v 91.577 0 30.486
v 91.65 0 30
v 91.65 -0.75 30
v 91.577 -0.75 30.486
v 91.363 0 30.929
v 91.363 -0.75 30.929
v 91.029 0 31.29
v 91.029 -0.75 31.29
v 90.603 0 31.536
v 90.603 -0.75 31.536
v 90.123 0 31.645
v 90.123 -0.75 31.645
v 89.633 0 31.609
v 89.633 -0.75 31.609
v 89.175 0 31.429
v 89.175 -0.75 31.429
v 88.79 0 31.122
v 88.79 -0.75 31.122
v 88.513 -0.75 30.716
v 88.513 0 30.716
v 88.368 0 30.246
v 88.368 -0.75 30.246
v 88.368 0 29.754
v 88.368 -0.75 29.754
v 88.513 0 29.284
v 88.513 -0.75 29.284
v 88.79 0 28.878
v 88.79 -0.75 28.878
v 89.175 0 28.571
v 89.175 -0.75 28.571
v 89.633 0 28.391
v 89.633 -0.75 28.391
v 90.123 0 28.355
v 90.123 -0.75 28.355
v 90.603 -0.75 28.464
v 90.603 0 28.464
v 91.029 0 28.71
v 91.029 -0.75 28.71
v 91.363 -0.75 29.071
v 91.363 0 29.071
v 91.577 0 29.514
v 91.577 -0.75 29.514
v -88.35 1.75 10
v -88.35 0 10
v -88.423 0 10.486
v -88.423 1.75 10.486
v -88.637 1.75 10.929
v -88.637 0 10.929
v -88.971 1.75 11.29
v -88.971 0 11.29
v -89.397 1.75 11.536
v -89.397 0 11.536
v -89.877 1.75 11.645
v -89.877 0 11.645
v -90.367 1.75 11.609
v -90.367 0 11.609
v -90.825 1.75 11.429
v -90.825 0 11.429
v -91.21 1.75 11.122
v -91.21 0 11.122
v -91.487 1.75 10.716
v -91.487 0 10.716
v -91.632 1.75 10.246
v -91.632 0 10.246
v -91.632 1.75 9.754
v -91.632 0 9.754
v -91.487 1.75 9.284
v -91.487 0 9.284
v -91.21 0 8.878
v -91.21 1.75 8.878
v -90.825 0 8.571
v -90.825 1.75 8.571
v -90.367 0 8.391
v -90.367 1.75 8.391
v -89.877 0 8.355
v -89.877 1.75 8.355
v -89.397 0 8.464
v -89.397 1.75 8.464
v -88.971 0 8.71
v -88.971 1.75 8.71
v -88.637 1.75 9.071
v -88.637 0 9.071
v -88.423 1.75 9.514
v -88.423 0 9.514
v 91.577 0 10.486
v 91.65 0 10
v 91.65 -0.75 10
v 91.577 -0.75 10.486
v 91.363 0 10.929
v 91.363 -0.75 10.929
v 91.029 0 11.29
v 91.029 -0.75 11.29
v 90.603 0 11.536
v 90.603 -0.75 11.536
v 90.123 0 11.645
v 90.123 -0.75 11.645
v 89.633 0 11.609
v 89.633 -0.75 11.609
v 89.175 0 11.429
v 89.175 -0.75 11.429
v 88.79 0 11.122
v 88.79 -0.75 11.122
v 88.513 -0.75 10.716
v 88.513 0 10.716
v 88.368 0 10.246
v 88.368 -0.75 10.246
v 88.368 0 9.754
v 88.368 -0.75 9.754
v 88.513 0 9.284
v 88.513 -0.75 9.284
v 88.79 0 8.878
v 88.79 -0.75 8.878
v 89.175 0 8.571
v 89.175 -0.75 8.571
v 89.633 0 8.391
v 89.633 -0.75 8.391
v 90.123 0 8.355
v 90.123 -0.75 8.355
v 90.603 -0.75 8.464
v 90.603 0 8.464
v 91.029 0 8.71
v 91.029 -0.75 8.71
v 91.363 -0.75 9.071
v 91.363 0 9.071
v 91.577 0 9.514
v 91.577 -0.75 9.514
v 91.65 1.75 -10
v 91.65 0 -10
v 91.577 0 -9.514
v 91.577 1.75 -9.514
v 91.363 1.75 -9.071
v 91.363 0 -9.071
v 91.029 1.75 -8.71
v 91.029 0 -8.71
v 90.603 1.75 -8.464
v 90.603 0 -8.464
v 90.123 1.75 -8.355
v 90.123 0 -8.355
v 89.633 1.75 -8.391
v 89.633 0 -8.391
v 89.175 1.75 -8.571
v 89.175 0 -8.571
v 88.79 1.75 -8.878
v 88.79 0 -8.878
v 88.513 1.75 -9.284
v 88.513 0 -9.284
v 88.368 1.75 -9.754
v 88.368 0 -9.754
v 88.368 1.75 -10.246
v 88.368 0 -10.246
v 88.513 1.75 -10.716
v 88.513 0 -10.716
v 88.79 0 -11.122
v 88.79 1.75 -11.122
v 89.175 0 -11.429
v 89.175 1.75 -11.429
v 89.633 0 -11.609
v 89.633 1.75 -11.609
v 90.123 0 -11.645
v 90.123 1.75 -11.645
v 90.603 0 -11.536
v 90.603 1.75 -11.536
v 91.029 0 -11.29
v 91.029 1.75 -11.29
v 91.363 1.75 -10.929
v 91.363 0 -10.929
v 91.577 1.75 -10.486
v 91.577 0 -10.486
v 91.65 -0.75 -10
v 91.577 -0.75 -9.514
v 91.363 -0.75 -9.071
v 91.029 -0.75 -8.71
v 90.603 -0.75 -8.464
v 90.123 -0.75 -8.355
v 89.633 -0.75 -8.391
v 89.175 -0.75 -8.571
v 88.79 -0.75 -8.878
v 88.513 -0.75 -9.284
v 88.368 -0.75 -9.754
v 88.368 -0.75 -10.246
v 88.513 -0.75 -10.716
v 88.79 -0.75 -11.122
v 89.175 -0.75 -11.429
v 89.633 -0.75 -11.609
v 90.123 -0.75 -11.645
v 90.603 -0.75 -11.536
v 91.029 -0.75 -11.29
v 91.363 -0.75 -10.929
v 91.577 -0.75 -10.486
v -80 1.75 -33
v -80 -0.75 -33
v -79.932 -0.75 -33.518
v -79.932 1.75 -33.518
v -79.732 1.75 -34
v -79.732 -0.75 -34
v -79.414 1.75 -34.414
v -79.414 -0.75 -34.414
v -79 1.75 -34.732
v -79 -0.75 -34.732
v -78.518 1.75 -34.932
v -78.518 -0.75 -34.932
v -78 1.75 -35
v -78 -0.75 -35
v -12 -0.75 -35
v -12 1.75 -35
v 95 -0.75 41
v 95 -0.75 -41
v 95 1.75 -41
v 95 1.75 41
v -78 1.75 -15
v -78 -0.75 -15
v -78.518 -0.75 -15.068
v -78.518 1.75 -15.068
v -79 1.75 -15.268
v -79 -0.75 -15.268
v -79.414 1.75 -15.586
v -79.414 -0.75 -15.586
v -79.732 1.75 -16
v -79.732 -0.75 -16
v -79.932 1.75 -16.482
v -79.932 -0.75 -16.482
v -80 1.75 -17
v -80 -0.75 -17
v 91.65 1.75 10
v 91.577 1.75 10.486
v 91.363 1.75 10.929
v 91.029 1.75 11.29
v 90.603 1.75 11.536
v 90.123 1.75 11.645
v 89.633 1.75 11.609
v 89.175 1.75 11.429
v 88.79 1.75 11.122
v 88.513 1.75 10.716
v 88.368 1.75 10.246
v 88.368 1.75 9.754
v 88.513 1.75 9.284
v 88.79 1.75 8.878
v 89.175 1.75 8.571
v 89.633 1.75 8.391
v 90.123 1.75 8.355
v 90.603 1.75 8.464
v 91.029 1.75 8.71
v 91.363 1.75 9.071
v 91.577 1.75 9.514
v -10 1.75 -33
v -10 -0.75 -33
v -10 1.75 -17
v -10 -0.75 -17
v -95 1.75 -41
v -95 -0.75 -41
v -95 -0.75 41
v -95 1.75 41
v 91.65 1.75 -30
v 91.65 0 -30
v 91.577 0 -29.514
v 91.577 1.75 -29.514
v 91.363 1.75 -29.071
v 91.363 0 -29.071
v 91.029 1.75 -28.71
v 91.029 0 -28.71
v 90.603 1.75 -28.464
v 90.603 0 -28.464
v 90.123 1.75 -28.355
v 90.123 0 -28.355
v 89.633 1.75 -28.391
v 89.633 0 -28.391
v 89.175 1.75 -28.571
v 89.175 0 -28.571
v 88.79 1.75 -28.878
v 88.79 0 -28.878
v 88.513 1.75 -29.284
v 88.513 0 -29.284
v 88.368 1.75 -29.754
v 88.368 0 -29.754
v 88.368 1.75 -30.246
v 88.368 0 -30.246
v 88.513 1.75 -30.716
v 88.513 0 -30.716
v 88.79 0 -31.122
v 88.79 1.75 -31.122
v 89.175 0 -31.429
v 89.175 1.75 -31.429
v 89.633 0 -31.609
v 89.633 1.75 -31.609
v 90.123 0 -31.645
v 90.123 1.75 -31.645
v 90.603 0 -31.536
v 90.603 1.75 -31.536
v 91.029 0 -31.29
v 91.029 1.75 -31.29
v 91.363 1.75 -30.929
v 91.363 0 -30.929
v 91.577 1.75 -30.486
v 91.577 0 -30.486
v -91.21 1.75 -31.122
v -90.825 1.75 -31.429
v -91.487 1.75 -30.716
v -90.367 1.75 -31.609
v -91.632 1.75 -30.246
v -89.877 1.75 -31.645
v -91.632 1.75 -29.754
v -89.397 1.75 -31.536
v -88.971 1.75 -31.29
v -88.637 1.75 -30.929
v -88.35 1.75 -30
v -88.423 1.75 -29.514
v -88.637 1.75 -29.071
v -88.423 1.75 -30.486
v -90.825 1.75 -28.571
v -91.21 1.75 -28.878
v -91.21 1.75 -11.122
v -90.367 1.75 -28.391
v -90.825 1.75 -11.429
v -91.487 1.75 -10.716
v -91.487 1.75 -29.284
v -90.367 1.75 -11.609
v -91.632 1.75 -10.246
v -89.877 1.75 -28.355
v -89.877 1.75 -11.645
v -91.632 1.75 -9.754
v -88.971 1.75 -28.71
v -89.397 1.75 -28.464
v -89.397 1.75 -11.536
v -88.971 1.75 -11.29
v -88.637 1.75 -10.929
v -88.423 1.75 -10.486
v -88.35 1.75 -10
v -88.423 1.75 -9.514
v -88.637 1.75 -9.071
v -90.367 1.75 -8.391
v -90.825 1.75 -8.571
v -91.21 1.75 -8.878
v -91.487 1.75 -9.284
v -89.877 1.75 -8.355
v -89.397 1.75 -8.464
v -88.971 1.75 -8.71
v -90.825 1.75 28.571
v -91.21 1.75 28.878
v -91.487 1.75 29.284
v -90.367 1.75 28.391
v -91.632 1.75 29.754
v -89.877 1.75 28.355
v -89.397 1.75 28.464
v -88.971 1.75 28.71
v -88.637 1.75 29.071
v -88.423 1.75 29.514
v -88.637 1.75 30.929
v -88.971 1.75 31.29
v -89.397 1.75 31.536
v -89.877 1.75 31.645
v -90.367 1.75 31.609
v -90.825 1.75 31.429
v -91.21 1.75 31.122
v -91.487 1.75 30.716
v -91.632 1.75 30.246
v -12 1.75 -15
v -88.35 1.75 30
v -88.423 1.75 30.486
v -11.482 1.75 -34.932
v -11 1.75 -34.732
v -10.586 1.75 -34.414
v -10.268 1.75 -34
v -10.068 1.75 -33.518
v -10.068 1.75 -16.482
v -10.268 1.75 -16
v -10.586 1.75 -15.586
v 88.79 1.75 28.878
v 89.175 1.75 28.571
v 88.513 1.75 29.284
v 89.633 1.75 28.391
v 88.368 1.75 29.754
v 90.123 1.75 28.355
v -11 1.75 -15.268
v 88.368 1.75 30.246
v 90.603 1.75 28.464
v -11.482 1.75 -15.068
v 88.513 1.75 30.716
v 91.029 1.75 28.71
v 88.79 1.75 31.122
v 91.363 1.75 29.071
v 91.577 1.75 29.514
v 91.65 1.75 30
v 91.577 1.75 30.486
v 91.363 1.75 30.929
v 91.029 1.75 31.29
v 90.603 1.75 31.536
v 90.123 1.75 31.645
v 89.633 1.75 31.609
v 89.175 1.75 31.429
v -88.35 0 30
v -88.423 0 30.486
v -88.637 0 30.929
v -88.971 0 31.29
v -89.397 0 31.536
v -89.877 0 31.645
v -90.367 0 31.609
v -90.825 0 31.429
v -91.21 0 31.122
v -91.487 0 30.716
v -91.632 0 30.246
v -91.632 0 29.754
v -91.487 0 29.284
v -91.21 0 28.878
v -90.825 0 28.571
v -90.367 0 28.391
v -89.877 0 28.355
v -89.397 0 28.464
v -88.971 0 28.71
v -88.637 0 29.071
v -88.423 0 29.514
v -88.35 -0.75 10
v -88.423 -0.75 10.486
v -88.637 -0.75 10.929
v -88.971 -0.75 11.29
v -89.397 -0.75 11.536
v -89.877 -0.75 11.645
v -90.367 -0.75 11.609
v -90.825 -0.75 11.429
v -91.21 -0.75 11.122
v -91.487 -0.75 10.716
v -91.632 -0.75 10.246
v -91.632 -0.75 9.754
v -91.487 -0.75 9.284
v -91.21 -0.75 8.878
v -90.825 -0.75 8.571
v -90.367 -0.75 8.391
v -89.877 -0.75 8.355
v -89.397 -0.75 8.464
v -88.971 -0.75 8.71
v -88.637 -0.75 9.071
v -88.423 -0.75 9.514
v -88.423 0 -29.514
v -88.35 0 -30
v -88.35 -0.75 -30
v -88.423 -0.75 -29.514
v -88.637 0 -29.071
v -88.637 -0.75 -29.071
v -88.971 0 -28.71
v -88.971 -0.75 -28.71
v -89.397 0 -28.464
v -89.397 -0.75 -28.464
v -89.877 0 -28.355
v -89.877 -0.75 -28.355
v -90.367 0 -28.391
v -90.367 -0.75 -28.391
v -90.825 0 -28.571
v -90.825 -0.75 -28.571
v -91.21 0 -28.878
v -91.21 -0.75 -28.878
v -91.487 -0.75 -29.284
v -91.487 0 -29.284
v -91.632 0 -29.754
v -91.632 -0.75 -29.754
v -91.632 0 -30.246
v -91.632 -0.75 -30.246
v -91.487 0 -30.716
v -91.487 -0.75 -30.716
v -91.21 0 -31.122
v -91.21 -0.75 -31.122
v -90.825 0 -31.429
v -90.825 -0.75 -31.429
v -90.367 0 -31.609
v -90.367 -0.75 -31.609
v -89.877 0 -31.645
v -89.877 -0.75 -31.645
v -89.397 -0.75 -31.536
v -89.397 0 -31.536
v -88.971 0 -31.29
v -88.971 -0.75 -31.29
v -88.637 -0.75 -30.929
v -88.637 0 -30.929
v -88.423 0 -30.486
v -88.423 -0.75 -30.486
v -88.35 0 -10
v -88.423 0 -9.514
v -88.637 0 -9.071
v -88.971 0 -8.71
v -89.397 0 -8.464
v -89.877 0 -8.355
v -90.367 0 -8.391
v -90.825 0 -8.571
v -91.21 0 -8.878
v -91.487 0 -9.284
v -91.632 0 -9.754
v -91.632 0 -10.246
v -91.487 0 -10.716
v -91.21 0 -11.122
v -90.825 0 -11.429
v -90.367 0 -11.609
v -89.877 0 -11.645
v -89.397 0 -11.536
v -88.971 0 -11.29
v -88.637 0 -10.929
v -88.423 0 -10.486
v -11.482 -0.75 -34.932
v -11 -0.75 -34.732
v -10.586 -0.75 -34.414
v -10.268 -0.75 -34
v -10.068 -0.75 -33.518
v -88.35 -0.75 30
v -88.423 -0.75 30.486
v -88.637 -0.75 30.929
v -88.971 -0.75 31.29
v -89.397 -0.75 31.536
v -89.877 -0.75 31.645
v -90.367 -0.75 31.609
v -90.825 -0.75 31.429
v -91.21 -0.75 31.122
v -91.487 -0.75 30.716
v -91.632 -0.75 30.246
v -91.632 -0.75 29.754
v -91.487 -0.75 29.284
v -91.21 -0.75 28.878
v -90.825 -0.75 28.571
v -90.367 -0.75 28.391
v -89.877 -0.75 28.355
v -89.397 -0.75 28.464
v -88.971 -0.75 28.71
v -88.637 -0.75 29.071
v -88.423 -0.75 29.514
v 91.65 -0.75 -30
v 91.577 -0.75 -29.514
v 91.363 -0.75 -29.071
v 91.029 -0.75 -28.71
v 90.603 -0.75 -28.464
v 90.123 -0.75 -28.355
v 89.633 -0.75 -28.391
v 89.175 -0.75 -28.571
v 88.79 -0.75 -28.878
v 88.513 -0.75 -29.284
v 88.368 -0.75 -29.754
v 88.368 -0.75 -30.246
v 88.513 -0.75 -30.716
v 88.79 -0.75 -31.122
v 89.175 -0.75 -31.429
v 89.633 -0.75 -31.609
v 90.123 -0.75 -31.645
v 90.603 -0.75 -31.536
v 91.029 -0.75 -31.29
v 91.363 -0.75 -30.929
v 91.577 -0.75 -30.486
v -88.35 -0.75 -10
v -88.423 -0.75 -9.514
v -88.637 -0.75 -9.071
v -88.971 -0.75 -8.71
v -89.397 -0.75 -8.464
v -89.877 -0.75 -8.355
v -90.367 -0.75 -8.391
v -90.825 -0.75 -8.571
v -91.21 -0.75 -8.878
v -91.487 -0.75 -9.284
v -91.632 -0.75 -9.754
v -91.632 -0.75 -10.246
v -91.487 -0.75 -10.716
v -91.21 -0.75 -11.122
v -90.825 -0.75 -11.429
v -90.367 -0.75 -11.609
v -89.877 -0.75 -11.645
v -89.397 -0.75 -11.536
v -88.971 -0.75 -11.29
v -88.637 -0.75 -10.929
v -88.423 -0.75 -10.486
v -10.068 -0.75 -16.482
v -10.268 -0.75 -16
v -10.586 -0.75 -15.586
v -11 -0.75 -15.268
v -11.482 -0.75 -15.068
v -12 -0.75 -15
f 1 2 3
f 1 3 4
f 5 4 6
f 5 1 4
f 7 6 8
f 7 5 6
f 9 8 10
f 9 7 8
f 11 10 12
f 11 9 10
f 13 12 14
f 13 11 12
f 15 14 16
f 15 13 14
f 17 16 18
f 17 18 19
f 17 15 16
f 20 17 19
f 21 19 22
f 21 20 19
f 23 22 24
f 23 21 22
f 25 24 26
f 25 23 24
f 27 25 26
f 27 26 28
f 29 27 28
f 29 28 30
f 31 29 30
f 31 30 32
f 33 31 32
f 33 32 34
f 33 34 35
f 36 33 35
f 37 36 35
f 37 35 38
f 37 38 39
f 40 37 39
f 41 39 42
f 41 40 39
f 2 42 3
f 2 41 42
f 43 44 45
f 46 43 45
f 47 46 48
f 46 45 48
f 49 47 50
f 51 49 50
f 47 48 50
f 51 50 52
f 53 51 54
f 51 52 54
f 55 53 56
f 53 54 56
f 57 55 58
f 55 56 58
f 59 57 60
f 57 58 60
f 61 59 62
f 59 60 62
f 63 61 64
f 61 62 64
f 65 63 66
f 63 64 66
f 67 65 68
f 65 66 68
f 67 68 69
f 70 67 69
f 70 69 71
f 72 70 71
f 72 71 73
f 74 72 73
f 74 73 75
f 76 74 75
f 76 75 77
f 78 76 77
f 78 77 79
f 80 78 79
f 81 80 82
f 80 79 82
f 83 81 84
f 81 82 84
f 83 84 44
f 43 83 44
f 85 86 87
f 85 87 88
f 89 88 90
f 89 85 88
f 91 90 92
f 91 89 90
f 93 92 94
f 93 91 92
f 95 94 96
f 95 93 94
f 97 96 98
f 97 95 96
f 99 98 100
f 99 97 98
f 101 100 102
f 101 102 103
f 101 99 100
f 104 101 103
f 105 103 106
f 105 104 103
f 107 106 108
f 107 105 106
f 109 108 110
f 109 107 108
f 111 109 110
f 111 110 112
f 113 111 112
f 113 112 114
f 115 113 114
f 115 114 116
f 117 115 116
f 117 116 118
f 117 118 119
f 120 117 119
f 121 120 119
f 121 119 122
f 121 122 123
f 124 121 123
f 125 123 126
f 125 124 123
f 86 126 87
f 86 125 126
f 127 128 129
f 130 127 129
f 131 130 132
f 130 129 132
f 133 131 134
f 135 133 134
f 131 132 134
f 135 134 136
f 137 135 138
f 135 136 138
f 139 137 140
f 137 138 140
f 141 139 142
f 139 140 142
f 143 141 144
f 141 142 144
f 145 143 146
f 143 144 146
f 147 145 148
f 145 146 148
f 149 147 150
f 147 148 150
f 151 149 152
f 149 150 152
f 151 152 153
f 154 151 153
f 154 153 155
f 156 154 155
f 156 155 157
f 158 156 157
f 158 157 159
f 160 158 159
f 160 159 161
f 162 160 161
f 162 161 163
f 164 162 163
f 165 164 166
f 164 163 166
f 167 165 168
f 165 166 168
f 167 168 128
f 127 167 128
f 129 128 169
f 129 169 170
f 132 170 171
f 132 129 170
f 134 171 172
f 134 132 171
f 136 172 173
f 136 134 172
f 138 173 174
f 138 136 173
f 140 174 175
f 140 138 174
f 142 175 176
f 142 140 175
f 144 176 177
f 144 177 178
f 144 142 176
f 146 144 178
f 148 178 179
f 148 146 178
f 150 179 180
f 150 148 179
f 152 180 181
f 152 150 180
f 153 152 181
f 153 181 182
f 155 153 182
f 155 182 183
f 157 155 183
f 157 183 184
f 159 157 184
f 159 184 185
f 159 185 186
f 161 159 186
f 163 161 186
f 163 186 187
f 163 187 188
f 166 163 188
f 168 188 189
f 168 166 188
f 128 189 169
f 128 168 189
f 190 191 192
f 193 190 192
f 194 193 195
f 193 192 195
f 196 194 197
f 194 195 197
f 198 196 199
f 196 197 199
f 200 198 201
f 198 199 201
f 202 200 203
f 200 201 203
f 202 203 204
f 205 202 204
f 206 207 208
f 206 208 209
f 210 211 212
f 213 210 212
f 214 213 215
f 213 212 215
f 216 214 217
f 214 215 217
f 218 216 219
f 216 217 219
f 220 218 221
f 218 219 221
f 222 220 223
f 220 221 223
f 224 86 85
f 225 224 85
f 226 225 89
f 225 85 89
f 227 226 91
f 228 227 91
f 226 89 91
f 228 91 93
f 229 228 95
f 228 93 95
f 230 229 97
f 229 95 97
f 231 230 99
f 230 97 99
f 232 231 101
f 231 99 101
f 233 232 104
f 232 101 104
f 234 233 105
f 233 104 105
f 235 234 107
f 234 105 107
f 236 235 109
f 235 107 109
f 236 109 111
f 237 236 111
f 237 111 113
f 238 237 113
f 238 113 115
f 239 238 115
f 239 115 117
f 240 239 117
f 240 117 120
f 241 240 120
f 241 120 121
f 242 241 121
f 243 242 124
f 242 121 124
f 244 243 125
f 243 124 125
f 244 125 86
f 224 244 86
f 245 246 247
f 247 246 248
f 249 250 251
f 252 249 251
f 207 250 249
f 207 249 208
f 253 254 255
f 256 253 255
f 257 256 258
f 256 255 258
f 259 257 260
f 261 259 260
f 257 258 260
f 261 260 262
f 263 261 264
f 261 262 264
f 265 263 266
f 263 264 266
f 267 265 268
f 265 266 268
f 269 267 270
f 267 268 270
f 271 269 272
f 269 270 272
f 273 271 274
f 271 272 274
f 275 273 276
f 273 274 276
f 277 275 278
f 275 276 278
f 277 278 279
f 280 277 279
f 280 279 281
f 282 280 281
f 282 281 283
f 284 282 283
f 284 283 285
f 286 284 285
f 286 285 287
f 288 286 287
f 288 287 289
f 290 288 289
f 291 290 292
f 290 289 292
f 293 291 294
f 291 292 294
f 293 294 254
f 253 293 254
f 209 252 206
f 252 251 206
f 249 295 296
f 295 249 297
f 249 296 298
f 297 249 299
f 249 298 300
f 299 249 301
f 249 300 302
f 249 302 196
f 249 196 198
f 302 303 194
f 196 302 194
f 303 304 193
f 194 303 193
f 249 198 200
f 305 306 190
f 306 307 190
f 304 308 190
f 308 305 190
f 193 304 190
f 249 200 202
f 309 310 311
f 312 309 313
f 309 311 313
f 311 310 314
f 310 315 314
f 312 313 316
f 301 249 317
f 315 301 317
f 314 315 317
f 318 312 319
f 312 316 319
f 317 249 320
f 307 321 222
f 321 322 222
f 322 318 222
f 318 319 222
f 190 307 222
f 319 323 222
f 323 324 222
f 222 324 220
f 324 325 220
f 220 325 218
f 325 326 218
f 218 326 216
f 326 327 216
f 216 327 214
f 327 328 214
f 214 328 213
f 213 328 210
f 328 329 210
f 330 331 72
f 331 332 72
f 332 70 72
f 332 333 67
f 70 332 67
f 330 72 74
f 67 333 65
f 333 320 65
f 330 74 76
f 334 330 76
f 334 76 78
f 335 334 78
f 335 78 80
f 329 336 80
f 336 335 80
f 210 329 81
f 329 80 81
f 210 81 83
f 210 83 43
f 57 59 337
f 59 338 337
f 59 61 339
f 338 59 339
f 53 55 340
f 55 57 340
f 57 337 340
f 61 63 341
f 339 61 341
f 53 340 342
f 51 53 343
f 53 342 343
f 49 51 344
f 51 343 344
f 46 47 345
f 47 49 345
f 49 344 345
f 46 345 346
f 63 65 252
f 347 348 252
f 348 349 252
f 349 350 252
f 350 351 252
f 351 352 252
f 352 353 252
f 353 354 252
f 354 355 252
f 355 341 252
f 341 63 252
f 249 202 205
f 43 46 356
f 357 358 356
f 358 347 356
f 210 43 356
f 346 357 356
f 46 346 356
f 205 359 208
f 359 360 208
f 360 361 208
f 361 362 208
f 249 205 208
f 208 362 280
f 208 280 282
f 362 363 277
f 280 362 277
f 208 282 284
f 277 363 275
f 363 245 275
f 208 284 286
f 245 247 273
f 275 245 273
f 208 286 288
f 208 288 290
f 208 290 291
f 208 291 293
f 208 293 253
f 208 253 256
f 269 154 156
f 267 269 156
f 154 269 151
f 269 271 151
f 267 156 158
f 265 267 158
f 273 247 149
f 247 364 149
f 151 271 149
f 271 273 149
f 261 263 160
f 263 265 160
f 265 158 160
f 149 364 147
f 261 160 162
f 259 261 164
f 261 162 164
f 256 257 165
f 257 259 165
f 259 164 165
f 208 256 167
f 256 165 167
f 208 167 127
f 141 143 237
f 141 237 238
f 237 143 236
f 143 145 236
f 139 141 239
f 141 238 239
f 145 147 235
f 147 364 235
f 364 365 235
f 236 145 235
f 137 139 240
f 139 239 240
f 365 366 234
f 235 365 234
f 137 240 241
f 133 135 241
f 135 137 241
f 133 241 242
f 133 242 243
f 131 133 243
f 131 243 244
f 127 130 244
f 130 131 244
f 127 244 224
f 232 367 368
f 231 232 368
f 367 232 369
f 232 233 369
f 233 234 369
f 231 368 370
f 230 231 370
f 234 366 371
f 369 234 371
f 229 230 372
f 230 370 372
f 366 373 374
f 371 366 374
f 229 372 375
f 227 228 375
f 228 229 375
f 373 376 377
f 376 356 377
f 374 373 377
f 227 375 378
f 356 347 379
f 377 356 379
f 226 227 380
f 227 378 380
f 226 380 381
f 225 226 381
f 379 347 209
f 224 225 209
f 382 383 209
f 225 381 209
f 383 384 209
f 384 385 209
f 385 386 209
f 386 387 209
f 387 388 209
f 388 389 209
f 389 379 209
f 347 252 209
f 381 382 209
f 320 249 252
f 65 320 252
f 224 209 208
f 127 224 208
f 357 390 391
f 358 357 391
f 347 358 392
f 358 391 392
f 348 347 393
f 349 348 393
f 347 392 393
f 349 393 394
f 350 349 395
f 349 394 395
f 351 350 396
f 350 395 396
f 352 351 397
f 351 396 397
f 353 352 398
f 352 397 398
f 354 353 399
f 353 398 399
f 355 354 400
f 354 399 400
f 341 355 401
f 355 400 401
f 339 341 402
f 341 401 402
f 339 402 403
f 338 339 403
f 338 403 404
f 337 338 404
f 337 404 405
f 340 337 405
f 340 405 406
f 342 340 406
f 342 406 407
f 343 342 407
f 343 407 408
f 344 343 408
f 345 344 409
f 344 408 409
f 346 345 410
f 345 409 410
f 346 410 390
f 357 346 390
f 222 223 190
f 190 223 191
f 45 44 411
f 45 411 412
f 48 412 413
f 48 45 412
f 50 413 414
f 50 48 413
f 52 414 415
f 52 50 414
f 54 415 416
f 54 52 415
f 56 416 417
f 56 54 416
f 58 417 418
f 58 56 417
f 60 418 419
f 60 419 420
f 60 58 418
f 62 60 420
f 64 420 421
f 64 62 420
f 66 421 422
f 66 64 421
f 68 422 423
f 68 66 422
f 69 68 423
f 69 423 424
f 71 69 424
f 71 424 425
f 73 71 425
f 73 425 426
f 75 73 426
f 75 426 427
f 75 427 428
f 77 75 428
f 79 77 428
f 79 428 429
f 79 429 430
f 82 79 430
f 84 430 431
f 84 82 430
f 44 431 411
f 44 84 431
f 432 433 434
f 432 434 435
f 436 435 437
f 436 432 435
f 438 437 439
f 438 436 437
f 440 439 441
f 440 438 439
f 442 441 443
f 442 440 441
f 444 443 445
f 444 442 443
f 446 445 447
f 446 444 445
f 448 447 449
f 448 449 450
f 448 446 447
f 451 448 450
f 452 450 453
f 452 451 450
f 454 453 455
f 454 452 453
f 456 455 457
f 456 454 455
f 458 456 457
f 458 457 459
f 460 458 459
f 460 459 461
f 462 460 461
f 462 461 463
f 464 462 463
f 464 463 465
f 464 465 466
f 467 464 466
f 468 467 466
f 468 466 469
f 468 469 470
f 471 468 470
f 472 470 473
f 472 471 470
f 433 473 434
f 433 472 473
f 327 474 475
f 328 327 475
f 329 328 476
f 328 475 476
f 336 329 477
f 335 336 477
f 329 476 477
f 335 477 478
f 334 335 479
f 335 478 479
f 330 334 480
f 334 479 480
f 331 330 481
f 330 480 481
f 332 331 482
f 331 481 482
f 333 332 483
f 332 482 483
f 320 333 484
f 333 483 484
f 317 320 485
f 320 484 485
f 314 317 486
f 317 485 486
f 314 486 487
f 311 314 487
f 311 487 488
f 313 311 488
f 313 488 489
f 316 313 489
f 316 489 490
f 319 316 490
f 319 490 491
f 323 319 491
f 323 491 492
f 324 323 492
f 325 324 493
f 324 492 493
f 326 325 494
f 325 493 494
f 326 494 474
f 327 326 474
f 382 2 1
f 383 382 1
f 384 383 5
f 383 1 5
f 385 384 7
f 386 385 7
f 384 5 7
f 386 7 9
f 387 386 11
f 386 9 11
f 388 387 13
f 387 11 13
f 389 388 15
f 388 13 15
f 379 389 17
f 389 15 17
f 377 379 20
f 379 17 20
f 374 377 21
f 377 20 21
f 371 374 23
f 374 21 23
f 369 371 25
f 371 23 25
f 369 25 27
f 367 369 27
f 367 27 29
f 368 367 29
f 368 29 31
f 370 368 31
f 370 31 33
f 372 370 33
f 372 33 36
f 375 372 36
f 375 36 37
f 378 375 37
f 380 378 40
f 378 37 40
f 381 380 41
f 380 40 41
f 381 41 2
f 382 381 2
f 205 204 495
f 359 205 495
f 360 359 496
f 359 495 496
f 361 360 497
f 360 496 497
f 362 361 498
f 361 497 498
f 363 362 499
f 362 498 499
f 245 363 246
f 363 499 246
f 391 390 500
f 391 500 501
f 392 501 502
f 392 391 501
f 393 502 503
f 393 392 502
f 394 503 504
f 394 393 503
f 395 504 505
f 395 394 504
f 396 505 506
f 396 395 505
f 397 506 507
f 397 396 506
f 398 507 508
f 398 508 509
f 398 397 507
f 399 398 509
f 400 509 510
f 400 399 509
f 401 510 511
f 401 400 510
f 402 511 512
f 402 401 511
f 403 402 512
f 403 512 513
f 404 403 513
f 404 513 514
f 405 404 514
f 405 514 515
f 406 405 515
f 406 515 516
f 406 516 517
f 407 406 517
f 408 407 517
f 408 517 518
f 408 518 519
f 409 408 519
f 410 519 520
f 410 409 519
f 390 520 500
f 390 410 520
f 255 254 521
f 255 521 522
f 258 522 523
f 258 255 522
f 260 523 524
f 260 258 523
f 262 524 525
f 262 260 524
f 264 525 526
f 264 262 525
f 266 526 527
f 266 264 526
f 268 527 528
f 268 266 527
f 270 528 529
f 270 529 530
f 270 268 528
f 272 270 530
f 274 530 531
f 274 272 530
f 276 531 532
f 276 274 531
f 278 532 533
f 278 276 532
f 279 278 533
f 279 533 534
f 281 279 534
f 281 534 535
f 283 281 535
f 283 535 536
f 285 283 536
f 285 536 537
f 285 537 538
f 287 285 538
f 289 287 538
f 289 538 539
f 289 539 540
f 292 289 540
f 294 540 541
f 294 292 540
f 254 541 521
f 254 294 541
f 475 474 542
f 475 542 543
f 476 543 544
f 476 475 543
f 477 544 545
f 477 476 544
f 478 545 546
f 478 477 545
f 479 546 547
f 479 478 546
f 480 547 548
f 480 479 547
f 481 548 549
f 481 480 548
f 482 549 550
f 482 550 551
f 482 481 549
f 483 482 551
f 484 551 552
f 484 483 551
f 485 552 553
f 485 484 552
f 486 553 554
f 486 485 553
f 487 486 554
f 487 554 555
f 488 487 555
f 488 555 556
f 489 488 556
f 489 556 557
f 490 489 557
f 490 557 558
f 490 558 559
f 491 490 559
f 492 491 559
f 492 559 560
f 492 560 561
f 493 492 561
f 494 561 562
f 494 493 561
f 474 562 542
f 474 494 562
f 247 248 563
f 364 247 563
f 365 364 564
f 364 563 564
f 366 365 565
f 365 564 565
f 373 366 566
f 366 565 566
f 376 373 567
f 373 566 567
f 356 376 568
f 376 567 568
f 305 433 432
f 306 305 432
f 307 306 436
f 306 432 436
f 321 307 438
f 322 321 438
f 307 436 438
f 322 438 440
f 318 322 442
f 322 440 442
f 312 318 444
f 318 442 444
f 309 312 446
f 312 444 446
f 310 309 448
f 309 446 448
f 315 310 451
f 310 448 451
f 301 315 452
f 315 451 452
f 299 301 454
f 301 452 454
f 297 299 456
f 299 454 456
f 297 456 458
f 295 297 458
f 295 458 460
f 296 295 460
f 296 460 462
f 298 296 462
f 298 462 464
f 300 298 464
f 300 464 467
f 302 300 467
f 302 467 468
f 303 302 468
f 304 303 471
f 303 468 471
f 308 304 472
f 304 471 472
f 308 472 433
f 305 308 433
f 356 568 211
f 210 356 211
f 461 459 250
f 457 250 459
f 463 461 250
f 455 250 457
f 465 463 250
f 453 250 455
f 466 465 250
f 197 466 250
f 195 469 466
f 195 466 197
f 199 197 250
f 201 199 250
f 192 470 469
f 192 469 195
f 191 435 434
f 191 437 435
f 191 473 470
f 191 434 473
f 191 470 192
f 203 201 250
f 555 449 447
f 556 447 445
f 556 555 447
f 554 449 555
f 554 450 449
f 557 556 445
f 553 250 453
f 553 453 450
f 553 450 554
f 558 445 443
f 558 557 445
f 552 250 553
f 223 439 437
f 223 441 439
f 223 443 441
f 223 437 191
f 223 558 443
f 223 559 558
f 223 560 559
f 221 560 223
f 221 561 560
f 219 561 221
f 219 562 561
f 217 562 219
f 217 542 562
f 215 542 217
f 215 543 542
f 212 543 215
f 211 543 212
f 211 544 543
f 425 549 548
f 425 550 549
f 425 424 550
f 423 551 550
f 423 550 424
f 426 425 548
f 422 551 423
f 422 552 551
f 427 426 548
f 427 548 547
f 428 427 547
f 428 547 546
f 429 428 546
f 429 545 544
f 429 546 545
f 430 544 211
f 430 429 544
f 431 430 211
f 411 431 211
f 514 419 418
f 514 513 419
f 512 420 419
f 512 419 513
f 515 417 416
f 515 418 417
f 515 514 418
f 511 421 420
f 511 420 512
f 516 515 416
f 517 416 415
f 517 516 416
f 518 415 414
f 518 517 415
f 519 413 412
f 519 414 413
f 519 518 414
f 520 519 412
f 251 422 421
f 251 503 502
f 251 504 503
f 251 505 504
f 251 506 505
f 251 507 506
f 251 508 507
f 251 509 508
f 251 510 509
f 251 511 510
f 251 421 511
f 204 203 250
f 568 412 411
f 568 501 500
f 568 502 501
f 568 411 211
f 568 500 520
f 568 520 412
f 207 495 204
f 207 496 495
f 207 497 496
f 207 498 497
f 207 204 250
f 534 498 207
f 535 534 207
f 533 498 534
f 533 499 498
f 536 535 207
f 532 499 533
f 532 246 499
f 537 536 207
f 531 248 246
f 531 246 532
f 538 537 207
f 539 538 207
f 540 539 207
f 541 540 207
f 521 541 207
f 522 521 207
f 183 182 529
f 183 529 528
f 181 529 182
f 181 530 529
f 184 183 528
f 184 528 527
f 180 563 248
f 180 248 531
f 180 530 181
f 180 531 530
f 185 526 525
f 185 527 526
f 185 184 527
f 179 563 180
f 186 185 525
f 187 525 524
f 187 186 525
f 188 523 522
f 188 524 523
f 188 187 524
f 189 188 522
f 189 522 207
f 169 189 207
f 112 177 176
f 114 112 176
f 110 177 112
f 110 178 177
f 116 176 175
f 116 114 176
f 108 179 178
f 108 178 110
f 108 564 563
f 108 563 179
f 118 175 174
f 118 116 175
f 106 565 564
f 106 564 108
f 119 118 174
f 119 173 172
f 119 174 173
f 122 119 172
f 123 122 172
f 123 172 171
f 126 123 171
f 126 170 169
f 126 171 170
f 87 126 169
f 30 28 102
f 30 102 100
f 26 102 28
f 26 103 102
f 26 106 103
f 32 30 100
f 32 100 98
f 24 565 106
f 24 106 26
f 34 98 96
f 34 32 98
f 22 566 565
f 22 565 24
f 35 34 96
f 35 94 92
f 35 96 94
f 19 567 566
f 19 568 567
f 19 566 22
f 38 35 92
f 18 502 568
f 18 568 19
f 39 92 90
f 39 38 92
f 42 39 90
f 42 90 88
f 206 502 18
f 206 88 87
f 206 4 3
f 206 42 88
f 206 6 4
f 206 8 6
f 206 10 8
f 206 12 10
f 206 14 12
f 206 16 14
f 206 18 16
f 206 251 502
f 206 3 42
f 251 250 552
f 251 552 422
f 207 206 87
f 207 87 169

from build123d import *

# Parameters (mm, degrees)
SKETCH_W       = 190
SKETCH_H       = 82
SKETCH_R       = 1.65
PAD_DEPTH      = 0.75
PAD_DEPTH_BACK = 1.75
POCKET_DEPTH   = 5


with BuildPart() as part:
    # Sketch → Pad (new body, two sides)
    with BuildSketch(Plane.XZ) as pad_sk:
        Rectangle(SKETCH_W, SKETCH_H)
        with Locations((90, 30)):
            Circle(SKETCH_R, mode=Mode.SUBTRACT)
        with Locations((90, 10)):
            Circle(SKETCH_R, mode=Mode.SUBTRACT)
        with Locations((90, -30)):
            Circle(SKETCH_R, mode=Mode.SUBTRACT)
        with Locations((90, -10)):
            Circle(SKETCH_R, mode=Mode.SUBTRACT)
        with Locations((-90, 30)):
            Circle(SKETCH_R, mode=Mode.SUBTRACT)
        with Locations((-90, 10)):
            Circle(SKETCH_R, mode=Mode.SUBTRACT)
        with Locations((-90, -30)):
            Circle(SKETCH_R, mode=Mode.SUBTRACT)
        with Locations((-90, -10)):
            Circle(SKETCH_R, mode=Mode.SUBTRACT)
    extrude(amount=PAD_DEPTH)
    extrude(pad_sk.sketch, amount=-PAD_DEPTH_BACK)

    # Sketch001 → Pocket (cut)
    with BuildSketch(Plane.XZ.offset(0.75)):
        with BuildLine():
            Line((-80, -17), (-80, -33))
            ThreePointArc((-80, -33), (-79.414214, -34.414214), (-78, -35))
            Line((-78, -35), (-12, -35))
            ThreePointArc((-12, -35), (-10.585786, -34.414214), (-10, -33))
            Line((-10, -33), (-10, -17))
            ThreePointArc((-10, -17), (-10.585786, -15.585786), (-12, -15))
            Line((-12, -15), (-78, -15))
            ThreePointArc((-78, -15), (-79.414214, -15.585786), (-80, -17))
        make_face()
    extrude(amount=-POCKET_DEPTH, mode=Mode.SUBTRACT)


solid = part.part
